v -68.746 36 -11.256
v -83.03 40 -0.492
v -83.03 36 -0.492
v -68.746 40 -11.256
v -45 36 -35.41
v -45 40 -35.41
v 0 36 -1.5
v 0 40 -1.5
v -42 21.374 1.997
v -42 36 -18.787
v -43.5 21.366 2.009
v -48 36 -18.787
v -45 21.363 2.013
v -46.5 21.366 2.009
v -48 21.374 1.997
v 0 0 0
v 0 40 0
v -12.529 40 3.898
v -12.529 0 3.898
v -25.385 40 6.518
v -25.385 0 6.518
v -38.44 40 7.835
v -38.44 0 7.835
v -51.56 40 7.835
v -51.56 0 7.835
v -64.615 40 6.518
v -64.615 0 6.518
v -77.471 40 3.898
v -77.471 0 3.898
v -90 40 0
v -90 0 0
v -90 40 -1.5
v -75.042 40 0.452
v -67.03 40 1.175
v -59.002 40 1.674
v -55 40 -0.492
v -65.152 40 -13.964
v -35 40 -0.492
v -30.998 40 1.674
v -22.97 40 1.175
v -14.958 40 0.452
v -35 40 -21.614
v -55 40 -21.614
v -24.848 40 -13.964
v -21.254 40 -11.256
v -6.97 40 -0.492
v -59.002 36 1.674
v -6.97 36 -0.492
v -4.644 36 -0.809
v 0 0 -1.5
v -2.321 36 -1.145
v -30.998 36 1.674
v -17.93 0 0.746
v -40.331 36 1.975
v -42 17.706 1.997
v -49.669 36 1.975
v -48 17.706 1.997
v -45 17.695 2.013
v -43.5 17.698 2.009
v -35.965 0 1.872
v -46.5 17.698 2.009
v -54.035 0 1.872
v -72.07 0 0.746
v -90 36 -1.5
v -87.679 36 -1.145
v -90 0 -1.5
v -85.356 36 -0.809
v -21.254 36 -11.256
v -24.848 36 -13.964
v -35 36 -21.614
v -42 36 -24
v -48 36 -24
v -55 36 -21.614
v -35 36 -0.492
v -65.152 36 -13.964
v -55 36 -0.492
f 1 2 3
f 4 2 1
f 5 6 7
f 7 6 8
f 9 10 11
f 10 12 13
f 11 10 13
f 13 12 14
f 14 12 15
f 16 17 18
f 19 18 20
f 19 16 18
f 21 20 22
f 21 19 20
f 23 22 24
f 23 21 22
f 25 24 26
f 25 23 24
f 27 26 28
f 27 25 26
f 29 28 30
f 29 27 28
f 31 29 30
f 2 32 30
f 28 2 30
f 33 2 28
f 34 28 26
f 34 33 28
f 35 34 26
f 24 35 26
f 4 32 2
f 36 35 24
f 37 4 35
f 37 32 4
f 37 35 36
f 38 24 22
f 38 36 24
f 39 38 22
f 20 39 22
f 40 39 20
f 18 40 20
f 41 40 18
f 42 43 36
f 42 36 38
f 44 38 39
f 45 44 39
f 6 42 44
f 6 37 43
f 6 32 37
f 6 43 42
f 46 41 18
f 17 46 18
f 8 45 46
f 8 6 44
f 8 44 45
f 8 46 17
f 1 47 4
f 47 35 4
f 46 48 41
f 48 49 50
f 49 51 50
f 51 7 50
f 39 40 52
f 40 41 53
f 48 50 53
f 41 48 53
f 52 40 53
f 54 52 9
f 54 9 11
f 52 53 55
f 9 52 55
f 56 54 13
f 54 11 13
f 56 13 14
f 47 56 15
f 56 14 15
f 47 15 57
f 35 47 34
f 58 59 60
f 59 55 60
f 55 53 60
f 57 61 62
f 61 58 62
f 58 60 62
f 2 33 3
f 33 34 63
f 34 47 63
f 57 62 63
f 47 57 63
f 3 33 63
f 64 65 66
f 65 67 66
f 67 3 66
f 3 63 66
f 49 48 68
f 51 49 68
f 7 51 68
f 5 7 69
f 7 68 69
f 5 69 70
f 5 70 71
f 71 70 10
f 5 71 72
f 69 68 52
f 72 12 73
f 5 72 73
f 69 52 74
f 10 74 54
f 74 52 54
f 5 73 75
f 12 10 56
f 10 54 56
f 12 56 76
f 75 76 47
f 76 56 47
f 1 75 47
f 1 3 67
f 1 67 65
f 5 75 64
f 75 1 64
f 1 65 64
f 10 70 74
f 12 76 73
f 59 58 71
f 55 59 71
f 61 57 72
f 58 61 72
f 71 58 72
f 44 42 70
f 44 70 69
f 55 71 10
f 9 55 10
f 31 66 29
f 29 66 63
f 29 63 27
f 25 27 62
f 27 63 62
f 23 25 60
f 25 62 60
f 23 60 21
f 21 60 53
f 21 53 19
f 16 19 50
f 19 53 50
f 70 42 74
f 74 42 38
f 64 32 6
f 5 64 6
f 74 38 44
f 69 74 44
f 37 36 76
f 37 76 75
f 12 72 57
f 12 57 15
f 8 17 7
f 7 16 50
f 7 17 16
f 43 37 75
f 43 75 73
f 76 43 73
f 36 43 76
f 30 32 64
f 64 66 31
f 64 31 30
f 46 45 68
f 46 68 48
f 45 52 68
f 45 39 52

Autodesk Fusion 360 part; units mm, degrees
sketch "Sketch1" plane through (0, 0, 0) normal (0, 1, 0) x (1, 0, 0)
  line L0 (0, 0) -> (-90, 0)
  line L1 (-90, 0) -> (-90, -8)
  line L2 (-90, -8) -> (0, -8)
  line L3 (0, -8) -> (0, 0)
  arc A0 (-90, 0) -> (0, 0) centre (-45, 122.5625) ccw
  line L4 (-90, 0) -> (0, 0)
  line L5 (0, 0) -> (0, 1.5)
  line L6 (0, 1.5) -> (-90, 1.5)
  line L7 (-90, 1.5) -> (-90, 0)
  arc A1 (-90, 1.5) -> (0, 1.5) centre (-45, 287.9873) ccw
  dimension "d1" = 8
  dimension "d2" = 90
  dimension "d3" = 1.5
  dimension "d4" = 290
extrude "Extrude1" add sketch "Sketch1" along normal blind 40 contours L0 A0 L4 A1 | L0 L4 L5 A1 | L0 L4 L7 A1
sketch "Sketch2" plane through (0, 40, 0) normal (0, 1, 0) x (-1, 0, 0)
  arc A0 (90, 0) -> (0, 0) centre (45, -122.5625) ccw
  line L0 (0, 0) -> (0, -1.5)
  arc A1 (90, -1.5) -> (0, -1.5) centre (45, -287.9873) ccw
  line L1 (90, -1.5) -> (90, 0)
  line L2 (90, -1.5) -> (45, -35.4099)
  line L3 (45, -35.4099) -> (0, -1.5)
  line L4 (83.0298, -0.4917) -> (45, -29.1493)
  line L5 (45, -29.1493) -> (6.9702, -0.4917)
  line L6 (45, -35.4099) -> (45, 3)
  line L7 (55, -21.6137) -> (55, 1.8402)
  line L8 (55, 1.8402) -> (45, 3)
  line L9 (45, 3) -> (35, 1.8402)
  line L10 (59.0023, 1.6744) -> (68.7457, -11.2556)
  line L11 (6.9702, -0.4917) -> (83.0298, -0.4917)
  line L12 (55, -0.4917) -> (65.1519, -13.9637)
  line L13 (30.9977, 1.6744) -> (21.2543, -11.2556)
  line L14 (35, -0.4917) -> (24.8481, -13.9637)
  line L15 (35, -21.6137) -> (35, 1.8402)
  dimension "d8" = 10
  dimension "d9" = 5
  dimension "d10" = 5
  dimension "d13" = 37
  dimension "d14" = 90
  dimension "d15" = 4.5
extrude "Extrude2" add sketch "Sketch2" against normal blind 4 contours A1 L2 L4 L6 | A1 L3 L5 L6 | A1 L7 L10 L11 | L4 L10 L11 L12 | L4 L6 L7 L11 | L5 L6 L11 L15 | A1 L11 L13 L15 | L5 L11 L13 L14 | A1 L6 L7 L11 | A1 L6 L11 L15
ref_plane "WorkPlane1" through (-45, 0, 0) normal (1, 0, 0) x (0, 1, 0)
sketch "Sketch3" plane through (-45, 0, 0) normal (1, 0, 0) x (0, 1, 0)
  line L0 (17, 3) -> (36, -24)
  line L1 (36, -24) -> (36, -18.7871)
  line L2 (36, -18.7871) -> (20.2674, 3.5698)
  line L3 (20.2674, 3.5698) -> (17, 3)
  dimension "d17" = 3
extrude "Extrude3" add sketch "Sketch3" along normal mid plane 6
